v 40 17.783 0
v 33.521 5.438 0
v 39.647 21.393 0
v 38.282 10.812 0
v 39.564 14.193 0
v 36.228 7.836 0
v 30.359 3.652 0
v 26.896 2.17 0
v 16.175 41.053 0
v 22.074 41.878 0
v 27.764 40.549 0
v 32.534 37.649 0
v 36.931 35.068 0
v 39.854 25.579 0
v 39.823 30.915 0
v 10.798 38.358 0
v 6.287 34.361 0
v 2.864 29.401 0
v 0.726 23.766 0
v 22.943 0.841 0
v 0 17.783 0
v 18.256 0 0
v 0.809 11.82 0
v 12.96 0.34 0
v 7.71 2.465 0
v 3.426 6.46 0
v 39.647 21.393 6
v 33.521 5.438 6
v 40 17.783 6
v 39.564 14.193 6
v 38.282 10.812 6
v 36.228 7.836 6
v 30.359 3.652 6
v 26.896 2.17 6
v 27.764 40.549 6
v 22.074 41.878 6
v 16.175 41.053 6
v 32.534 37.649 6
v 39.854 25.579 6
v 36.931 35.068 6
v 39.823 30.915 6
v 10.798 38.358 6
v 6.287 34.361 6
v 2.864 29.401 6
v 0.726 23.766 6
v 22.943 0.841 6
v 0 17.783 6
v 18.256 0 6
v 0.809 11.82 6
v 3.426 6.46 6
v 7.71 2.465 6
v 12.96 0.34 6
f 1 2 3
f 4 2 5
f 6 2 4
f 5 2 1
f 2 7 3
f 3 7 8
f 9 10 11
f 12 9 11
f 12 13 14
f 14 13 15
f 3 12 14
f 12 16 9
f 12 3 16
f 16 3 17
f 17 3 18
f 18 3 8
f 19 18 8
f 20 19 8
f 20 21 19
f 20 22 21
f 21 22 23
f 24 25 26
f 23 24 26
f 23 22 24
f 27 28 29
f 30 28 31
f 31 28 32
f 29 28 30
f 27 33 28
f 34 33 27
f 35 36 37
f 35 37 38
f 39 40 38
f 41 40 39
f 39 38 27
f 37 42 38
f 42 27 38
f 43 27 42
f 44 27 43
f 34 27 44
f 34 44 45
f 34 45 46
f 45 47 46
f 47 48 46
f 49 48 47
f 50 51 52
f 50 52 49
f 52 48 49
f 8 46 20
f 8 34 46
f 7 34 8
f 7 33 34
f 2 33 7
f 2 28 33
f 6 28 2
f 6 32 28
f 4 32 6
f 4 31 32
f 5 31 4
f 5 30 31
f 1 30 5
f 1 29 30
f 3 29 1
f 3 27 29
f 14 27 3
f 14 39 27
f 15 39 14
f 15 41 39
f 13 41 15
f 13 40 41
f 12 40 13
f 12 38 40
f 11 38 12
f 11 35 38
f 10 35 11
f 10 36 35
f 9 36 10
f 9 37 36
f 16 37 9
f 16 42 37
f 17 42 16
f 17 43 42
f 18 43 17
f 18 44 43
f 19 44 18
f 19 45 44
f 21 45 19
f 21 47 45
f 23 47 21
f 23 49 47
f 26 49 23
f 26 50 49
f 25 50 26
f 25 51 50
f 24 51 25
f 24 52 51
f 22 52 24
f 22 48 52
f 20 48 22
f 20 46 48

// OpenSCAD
$fn = 32;

// ----------------------------------------------------------------------
// Cam disc: base radius 15.0 mm, lift 10.0 mm, 26 profile points
// ----------------------------------------------------------------------

// --- parameters (mm) ---
profile_height = 6;       // extrusion height
profile_points = 26;      // points of the closed outline

profile = [[40, 17.783], [39.647, 21.393], [39.854, 25.579], [39.823, 30.915], [36.931, 35.068], [32.534, 37.649], [27.764, 40.549], [22.074, 41.878], [16.175, 41.053], [10.798, 38.358], [6.287, 34.361], [2.864, 29.401], [0.726, 23.766], [0, 17.783], [0.809, 11.82], [3.426, 6.46], [7.71, 2.465], [12.96, 0.34], [18.256, 0], [22.943, 0.841], [26.896, 2.17], [30.359, 3.652], [33.521, 5.438], [36.228, 7.836], [38.282, 10.812], [39.564, 14.193]];  // single closed polygon, 26 points, counter clockwise

// --- the one profile operation ---
linear_extrude(height = profile_height) polygon(points = profile);
